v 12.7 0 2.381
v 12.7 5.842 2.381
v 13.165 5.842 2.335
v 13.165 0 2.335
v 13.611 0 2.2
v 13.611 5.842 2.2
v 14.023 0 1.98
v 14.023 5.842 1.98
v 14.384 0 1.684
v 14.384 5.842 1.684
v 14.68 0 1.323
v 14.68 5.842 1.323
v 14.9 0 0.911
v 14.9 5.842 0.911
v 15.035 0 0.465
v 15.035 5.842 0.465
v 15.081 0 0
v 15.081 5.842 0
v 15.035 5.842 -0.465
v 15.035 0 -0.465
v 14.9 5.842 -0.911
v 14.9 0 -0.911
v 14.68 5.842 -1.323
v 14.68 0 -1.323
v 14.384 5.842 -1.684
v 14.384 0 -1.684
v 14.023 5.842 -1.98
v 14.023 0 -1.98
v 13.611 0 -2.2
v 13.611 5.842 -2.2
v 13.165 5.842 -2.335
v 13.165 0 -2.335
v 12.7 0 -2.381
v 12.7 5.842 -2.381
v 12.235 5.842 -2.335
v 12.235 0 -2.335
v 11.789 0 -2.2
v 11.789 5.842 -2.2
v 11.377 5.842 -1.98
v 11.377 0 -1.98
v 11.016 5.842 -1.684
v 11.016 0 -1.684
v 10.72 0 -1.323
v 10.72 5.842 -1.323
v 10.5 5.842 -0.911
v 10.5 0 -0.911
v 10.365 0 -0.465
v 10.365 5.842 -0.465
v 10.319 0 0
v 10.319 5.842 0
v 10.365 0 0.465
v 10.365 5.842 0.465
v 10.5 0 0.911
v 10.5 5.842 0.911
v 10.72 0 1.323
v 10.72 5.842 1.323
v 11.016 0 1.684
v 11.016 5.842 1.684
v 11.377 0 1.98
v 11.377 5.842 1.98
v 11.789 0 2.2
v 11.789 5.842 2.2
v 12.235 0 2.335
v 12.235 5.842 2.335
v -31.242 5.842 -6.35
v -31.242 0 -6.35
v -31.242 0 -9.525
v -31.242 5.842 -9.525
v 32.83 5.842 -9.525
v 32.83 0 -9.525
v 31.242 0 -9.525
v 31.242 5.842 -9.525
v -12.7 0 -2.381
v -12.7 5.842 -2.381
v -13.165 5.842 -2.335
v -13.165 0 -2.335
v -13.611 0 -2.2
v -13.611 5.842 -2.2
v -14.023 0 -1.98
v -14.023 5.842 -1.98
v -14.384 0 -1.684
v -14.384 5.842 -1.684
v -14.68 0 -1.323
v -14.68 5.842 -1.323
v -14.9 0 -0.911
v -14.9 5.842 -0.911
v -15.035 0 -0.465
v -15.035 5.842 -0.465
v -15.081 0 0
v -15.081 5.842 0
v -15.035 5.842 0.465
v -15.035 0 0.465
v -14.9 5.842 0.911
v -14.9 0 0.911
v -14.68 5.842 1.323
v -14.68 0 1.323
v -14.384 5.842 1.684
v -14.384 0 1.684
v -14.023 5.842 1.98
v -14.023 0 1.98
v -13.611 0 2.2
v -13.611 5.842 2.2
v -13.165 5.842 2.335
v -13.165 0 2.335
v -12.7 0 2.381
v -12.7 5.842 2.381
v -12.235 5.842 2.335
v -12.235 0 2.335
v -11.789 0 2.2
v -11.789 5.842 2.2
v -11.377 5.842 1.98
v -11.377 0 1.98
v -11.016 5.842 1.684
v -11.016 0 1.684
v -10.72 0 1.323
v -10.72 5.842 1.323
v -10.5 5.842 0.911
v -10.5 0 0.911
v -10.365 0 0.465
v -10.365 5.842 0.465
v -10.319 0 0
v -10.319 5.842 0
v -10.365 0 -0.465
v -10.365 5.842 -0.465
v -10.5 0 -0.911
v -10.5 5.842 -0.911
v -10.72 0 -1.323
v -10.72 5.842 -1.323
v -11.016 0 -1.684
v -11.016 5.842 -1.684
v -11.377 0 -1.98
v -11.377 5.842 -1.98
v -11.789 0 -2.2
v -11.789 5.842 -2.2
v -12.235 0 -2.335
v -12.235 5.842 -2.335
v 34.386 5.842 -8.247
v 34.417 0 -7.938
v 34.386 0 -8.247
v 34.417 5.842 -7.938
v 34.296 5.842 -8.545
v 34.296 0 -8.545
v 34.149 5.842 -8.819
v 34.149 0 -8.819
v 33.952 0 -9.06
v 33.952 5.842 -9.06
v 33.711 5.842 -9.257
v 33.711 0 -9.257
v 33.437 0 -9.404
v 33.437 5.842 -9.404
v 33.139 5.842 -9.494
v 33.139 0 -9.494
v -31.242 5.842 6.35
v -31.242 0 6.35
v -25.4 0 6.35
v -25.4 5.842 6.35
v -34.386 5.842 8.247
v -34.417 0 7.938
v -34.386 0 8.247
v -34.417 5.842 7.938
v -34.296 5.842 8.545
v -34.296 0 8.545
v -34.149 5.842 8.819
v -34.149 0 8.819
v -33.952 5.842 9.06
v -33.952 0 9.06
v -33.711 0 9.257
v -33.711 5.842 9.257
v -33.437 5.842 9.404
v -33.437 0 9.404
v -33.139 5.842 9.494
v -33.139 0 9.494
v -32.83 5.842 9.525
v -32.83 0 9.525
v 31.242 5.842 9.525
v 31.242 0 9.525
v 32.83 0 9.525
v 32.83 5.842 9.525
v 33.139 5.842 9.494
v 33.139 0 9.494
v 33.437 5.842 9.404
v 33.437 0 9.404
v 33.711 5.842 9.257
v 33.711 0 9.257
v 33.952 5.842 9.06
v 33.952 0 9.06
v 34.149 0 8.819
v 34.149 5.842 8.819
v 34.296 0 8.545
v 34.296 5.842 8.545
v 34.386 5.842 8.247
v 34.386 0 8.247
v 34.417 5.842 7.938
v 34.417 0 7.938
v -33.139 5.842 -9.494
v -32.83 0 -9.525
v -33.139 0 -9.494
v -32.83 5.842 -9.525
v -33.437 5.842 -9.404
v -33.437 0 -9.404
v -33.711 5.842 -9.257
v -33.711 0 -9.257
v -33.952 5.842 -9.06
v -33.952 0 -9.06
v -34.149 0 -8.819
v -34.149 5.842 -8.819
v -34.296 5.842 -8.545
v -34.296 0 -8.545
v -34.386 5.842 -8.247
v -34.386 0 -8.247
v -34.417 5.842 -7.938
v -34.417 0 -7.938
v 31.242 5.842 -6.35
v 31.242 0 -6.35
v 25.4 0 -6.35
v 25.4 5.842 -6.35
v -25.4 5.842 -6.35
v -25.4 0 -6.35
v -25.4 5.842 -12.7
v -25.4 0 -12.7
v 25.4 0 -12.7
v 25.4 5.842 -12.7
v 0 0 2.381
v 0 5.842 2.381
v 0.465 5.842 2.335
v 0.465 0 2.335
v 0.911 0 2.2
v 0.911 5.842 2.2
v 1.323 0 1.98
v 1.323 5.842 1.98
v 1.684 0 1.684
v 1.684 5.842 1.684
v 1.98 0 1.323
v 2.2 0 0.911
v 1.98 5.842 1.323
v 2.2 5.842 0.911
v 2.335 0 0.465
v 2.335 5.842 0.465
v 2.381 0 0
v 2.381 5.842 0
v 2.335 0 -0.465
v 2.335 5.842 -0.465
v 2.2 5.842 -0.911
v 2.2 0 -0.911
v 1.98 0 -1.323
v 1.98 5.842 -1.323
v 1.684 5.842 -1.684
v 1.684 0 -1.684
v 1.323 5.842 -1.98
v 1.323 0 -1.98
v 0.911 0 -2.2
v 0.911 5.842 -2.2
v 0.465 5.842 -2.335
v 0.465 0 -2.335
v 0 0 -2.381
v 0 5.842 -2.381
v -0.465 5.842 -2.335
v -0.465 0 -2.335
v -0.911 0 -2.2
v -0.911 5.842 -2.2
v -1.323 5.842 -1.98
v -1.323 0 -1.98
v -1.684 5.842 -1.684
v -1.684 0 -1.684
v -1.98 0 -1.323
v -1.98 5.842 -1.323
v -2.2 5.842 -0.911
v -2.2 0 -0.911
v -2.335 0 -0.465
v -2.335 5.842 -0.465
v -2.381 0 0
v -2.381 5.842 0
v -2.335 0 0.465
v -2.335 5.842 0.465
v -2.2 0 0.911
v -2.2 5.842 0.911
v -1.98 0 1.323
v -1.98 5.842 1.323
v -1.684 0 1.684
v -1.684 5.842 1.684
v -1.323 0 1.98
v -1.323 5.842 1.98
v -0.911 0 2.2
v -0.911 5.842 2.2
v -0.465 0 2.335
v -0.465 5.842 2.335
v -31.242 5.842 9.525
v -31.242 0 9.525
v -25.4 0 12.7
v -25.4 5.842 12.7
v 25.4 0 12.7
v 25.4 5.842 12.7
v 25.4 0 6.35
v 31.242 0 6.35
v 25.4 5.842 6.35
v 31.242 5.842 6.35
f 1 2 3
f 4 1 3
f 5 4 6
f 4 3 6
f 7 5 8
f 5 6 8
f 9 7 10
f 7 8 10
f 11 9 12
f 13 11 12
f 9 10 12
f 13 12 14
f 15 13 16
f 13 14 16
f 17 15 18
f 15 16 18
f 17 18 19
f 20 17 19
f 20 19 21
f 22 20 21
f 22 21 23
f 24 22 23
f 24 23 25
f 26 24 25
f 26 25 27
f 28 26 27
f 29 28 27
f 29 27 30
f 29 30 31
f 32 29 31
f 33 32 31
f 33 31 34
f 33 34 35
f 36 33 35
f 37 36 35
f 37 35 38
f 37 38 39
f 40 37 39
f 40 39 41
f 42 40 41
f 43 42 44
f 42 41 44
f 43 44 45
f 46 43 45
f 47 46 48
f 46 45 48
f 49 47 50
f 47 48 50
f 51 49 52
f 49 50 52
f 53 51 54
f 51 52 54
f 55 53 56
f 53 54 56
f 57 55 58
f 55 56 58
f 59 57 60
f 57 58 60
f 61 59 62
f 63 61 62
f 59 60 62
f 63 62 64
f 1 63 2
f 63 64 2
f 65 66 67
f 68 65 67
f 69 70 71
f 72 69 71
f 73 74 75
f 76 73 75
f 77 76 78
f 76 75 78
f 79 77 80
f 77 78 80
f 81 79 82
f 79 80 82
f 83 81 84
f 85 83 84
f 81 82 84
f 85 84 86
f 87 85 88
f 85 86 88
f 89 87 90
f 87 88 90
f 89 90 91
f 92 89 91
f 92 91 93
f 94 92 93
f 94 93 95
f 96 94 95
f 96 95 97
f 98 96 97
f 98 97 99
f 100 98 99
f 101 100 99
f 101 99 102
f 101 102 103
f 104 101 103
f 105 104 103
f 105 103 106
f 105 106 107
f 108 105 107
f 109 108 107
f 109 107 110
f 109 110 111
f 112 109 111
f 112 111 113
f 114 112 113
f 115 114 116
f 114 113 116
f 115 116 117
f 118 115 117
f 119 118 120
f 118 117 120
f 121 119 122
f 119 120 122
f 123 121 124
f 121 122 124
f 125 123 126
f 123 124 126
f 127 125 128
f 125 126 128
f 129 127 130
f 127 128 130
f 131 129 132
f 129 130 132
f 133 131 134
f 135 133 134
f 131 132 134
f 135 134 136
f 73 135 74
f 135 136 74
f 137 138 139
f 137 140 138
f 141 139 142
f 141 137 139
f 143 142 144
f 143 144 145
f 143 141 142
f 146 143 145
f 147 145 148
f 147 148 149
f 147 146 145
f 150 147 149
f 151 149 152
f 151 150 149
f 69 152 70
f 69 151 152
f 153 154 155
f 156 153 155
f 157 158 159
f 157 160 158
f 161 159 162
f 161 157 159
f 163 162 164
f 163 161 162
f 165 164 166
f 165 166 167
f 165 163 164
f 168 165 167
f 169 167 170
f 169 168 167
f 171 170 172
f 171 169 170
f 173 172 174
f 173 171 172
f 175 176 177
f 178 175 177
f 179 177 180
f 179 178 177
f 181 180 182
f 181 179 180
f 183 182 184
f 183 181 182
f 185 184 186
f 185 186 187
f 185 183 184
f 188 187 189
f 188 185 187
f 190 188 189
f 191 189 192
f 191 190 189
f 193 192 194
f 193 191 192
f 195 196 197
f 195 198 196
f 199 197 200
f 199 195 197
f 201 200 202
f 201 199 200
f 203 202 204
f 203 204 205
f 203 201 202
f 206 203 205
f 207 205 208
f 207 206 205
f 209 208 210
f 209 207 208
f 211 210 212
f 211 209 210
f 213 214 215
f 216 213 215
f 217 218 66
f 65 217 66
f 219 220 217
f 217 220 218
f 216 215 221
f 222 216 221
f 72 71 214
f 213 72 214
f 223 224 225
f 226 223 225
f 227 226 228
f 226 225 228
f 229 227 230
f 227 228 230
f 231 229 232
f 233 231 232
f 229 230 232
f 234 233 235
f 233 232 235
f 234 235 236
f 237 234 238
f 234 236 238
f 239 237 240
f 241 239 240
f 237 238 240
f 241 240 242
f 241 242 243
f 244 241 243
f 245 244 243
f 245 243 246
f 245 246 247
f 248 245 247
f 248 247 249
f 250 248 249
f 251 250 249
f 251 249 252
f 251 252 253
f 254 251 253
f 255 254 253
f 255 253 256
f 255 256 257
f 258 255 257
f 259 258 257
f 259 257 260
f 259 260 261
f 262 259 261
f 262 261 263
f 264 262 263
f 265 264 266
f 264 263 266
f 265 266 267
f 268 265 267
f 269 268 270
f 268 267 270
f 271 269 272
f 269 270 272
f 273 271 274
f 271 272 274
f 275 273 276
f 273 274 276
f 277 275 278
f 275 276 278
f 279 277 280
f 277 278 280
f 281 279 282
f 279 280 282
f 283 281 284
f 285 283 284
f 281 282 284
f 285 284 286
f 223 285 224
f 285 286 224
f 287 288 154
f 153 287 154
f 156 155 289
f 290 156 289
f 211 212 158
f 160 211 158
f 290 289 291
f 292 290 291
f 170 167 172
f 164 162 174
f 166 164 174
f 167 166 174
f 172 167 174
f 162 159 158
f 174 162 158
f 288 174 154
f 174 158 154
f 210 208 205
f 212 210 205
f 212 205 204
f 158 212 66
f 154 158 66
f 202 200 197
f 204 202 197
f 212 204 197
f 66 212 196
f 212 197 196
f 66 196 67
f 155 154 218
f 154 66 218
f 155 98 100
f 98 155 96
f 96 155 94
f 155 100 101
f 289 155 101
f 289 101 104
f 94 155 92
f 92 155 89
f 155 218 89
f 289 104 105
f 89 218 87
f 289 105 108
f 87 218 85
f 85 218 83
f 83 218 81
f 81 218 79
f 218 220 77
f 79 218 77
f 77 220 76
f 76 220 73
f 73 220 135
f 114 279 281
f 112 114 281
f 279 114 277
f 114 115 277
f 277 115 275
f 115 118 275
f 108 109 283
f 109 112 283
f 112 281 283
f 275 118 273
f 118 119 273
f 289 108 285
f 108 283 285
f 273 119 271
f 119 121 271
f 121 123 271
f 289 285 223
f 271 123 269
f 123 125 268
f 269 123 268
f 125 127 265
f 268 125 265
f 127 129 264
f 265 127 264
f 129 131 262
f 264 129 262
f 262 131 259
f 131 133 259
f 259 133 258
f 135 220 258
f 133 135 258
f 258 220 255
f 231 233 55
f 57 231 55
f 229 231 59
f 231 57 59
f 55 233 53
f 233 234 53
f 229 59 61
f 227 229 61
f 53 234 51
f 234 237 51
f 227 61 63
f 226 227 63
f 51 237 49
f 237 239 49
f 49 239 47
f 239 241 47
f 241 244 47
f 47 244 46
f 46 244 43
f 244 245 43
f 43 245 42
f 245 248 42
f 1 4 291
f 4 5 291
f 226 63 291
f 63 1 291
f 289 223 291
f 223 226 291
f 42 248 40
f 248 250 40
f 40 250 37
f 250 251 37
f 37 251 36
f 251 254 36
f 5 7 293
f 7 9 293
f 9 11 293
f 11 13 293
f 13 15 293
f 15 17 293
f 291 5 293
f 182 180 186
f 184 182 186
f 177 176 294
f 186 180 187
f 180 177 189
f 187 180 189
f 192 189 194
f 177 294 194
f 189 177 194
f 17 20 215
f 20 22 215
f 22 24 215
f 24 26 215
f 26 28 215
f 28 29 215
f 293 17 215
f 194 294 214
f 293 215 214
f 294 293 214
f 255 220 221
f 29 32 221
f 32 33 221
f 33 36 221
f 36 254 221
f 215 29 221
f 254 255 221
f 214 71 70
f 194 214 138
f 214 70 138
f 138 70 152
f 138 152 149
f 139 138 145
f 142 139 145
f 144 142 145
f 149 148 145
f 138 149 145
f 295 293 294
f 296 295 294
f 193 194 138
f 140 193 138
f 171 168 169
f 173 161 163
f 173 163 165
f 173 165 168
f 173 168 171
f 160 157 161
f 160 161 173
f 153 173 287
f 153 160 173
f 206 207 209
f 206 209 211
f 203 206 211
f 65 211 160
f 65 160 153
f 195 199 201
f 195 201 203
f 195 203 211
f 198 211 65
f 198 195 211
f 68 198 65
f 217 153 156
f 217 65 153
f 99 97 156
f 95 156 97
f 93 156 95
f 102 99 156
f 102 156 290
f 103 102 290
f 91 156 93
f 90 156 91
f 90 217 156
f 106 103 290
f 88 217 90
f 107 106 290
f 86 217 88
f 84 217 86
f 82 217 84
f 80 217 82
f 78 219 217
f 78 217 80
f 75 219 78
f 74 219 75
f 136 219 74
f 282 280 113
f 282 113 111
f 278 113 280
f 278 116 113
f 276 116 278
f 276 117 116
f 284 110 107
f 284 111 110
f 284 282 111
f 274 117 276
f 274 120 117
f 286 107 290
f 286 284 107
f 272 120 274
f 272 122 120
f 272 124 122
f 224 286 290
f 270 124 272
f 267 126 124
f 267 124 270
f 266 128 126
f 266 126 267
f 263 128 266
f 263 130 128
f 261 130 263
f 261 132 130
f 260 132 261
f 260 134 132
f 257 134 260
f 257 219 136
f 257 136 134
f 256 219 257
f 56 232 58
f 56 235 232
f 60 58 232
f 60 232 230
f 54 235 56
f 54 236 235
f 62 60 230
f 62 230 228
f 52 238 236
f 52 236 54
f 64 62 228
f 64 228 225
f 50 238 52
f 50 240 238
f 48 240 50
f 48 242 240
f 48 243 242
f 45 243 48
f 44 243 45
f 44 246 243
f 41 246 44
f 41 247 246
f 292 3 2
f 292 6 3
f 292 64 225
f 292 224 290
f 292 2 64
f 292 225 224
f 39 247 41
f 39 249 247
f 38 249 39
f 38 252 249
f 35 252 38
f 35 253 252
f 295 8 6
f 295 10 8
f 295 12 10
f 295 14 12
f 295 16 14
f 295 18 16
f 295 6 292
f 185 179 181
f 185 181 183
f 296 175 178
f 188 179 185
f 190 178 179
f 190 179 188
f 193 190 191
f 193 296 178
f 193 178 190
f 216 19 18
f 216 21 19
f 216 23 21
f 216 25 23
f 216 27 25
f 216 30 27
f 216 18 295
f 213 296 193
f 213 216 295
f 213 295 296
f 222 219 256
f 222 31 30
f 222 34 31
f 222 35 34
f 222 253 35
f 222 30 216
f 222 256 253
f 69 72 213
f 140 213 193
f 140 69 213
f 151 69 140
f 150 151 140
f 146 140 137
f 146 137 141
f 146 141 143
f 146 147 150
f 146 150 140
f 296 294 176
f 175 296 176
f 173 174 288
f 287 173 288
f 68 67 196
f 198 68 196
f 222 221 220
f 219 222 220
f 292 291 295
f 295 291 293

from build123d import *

# Parameters (mm, degrees)
BOSS_EXTRUDE1_DEPTH = 5.842
FILLET1_R           = 1.5875
SKETCH2_R           = 2.38125
CUT_EXTRUDE1_DEPTH  = 38.14766282


with BuildPart() as part:
    # Sketch1 → Boss-Extrude1 (new body)
    with BuildSketch(Plane(origin=(0, 0, 0), x_dir=(1, 0, 0), z_dir=(0, 1, 0))):
        Polygon((-25.4, -12.7), (25.4, -12.7), (25.4, -6.35), (31.242, -6.35), (31.242, -9.525), (34.417, -9.525), (34.417, 9.525), (31.242, 9.525), (31.242, 6.35), (25.4, 6.35), (25.4, 12.7), (-25.4, 12.7), (-25.4, 6.35), (-31.242, 6.35), (-31.242, 9.525), (-34.417, 9.525), (-34.417, -9.525), (-31.242, -9.525), (-31.242, -6.35), (-25.4, -6.35), align=None)
    extrude(amount=BOSS_EXTRUDE1_DEPTH)

    # Fillet1
    fillet1_edges = [part.edges().sort_by_distance(p)[0] for p in [
        (34.417, 2.921, -9.525),
        (34.417, 2.921, 9.525),
        (-34.417, 2.921, 9.525),
        (-34.417, 2.921, -9.525),
    ]]
    fillet(fillet1_edges, radius=FILLET1_R)

    # Sketch2 → Cut-Extrude1 (cut, through all)
    with BuildSketch(Plane(origin=(0, 5.842, 0), x_dir=(1, 0, 0), z_dir=(0, 1, 0))):
        with Locations(Location((0, 0, 0), (0, 0, 270))):
            Circle(SKETCH2_R)
        with Locations(Location((12.7, 0, 0), (0, 0, 270))):
            Circle(SKETCH2_R)
        with Locations(Location((-12.7, 0, 0), (0, 0, 90))):
            Circle(SKETCH2_R)
    extrude(amount=-CUT_EXTRUDE1_DEPTH, mode=Mode.SUBTRACT)


solid = part.part
